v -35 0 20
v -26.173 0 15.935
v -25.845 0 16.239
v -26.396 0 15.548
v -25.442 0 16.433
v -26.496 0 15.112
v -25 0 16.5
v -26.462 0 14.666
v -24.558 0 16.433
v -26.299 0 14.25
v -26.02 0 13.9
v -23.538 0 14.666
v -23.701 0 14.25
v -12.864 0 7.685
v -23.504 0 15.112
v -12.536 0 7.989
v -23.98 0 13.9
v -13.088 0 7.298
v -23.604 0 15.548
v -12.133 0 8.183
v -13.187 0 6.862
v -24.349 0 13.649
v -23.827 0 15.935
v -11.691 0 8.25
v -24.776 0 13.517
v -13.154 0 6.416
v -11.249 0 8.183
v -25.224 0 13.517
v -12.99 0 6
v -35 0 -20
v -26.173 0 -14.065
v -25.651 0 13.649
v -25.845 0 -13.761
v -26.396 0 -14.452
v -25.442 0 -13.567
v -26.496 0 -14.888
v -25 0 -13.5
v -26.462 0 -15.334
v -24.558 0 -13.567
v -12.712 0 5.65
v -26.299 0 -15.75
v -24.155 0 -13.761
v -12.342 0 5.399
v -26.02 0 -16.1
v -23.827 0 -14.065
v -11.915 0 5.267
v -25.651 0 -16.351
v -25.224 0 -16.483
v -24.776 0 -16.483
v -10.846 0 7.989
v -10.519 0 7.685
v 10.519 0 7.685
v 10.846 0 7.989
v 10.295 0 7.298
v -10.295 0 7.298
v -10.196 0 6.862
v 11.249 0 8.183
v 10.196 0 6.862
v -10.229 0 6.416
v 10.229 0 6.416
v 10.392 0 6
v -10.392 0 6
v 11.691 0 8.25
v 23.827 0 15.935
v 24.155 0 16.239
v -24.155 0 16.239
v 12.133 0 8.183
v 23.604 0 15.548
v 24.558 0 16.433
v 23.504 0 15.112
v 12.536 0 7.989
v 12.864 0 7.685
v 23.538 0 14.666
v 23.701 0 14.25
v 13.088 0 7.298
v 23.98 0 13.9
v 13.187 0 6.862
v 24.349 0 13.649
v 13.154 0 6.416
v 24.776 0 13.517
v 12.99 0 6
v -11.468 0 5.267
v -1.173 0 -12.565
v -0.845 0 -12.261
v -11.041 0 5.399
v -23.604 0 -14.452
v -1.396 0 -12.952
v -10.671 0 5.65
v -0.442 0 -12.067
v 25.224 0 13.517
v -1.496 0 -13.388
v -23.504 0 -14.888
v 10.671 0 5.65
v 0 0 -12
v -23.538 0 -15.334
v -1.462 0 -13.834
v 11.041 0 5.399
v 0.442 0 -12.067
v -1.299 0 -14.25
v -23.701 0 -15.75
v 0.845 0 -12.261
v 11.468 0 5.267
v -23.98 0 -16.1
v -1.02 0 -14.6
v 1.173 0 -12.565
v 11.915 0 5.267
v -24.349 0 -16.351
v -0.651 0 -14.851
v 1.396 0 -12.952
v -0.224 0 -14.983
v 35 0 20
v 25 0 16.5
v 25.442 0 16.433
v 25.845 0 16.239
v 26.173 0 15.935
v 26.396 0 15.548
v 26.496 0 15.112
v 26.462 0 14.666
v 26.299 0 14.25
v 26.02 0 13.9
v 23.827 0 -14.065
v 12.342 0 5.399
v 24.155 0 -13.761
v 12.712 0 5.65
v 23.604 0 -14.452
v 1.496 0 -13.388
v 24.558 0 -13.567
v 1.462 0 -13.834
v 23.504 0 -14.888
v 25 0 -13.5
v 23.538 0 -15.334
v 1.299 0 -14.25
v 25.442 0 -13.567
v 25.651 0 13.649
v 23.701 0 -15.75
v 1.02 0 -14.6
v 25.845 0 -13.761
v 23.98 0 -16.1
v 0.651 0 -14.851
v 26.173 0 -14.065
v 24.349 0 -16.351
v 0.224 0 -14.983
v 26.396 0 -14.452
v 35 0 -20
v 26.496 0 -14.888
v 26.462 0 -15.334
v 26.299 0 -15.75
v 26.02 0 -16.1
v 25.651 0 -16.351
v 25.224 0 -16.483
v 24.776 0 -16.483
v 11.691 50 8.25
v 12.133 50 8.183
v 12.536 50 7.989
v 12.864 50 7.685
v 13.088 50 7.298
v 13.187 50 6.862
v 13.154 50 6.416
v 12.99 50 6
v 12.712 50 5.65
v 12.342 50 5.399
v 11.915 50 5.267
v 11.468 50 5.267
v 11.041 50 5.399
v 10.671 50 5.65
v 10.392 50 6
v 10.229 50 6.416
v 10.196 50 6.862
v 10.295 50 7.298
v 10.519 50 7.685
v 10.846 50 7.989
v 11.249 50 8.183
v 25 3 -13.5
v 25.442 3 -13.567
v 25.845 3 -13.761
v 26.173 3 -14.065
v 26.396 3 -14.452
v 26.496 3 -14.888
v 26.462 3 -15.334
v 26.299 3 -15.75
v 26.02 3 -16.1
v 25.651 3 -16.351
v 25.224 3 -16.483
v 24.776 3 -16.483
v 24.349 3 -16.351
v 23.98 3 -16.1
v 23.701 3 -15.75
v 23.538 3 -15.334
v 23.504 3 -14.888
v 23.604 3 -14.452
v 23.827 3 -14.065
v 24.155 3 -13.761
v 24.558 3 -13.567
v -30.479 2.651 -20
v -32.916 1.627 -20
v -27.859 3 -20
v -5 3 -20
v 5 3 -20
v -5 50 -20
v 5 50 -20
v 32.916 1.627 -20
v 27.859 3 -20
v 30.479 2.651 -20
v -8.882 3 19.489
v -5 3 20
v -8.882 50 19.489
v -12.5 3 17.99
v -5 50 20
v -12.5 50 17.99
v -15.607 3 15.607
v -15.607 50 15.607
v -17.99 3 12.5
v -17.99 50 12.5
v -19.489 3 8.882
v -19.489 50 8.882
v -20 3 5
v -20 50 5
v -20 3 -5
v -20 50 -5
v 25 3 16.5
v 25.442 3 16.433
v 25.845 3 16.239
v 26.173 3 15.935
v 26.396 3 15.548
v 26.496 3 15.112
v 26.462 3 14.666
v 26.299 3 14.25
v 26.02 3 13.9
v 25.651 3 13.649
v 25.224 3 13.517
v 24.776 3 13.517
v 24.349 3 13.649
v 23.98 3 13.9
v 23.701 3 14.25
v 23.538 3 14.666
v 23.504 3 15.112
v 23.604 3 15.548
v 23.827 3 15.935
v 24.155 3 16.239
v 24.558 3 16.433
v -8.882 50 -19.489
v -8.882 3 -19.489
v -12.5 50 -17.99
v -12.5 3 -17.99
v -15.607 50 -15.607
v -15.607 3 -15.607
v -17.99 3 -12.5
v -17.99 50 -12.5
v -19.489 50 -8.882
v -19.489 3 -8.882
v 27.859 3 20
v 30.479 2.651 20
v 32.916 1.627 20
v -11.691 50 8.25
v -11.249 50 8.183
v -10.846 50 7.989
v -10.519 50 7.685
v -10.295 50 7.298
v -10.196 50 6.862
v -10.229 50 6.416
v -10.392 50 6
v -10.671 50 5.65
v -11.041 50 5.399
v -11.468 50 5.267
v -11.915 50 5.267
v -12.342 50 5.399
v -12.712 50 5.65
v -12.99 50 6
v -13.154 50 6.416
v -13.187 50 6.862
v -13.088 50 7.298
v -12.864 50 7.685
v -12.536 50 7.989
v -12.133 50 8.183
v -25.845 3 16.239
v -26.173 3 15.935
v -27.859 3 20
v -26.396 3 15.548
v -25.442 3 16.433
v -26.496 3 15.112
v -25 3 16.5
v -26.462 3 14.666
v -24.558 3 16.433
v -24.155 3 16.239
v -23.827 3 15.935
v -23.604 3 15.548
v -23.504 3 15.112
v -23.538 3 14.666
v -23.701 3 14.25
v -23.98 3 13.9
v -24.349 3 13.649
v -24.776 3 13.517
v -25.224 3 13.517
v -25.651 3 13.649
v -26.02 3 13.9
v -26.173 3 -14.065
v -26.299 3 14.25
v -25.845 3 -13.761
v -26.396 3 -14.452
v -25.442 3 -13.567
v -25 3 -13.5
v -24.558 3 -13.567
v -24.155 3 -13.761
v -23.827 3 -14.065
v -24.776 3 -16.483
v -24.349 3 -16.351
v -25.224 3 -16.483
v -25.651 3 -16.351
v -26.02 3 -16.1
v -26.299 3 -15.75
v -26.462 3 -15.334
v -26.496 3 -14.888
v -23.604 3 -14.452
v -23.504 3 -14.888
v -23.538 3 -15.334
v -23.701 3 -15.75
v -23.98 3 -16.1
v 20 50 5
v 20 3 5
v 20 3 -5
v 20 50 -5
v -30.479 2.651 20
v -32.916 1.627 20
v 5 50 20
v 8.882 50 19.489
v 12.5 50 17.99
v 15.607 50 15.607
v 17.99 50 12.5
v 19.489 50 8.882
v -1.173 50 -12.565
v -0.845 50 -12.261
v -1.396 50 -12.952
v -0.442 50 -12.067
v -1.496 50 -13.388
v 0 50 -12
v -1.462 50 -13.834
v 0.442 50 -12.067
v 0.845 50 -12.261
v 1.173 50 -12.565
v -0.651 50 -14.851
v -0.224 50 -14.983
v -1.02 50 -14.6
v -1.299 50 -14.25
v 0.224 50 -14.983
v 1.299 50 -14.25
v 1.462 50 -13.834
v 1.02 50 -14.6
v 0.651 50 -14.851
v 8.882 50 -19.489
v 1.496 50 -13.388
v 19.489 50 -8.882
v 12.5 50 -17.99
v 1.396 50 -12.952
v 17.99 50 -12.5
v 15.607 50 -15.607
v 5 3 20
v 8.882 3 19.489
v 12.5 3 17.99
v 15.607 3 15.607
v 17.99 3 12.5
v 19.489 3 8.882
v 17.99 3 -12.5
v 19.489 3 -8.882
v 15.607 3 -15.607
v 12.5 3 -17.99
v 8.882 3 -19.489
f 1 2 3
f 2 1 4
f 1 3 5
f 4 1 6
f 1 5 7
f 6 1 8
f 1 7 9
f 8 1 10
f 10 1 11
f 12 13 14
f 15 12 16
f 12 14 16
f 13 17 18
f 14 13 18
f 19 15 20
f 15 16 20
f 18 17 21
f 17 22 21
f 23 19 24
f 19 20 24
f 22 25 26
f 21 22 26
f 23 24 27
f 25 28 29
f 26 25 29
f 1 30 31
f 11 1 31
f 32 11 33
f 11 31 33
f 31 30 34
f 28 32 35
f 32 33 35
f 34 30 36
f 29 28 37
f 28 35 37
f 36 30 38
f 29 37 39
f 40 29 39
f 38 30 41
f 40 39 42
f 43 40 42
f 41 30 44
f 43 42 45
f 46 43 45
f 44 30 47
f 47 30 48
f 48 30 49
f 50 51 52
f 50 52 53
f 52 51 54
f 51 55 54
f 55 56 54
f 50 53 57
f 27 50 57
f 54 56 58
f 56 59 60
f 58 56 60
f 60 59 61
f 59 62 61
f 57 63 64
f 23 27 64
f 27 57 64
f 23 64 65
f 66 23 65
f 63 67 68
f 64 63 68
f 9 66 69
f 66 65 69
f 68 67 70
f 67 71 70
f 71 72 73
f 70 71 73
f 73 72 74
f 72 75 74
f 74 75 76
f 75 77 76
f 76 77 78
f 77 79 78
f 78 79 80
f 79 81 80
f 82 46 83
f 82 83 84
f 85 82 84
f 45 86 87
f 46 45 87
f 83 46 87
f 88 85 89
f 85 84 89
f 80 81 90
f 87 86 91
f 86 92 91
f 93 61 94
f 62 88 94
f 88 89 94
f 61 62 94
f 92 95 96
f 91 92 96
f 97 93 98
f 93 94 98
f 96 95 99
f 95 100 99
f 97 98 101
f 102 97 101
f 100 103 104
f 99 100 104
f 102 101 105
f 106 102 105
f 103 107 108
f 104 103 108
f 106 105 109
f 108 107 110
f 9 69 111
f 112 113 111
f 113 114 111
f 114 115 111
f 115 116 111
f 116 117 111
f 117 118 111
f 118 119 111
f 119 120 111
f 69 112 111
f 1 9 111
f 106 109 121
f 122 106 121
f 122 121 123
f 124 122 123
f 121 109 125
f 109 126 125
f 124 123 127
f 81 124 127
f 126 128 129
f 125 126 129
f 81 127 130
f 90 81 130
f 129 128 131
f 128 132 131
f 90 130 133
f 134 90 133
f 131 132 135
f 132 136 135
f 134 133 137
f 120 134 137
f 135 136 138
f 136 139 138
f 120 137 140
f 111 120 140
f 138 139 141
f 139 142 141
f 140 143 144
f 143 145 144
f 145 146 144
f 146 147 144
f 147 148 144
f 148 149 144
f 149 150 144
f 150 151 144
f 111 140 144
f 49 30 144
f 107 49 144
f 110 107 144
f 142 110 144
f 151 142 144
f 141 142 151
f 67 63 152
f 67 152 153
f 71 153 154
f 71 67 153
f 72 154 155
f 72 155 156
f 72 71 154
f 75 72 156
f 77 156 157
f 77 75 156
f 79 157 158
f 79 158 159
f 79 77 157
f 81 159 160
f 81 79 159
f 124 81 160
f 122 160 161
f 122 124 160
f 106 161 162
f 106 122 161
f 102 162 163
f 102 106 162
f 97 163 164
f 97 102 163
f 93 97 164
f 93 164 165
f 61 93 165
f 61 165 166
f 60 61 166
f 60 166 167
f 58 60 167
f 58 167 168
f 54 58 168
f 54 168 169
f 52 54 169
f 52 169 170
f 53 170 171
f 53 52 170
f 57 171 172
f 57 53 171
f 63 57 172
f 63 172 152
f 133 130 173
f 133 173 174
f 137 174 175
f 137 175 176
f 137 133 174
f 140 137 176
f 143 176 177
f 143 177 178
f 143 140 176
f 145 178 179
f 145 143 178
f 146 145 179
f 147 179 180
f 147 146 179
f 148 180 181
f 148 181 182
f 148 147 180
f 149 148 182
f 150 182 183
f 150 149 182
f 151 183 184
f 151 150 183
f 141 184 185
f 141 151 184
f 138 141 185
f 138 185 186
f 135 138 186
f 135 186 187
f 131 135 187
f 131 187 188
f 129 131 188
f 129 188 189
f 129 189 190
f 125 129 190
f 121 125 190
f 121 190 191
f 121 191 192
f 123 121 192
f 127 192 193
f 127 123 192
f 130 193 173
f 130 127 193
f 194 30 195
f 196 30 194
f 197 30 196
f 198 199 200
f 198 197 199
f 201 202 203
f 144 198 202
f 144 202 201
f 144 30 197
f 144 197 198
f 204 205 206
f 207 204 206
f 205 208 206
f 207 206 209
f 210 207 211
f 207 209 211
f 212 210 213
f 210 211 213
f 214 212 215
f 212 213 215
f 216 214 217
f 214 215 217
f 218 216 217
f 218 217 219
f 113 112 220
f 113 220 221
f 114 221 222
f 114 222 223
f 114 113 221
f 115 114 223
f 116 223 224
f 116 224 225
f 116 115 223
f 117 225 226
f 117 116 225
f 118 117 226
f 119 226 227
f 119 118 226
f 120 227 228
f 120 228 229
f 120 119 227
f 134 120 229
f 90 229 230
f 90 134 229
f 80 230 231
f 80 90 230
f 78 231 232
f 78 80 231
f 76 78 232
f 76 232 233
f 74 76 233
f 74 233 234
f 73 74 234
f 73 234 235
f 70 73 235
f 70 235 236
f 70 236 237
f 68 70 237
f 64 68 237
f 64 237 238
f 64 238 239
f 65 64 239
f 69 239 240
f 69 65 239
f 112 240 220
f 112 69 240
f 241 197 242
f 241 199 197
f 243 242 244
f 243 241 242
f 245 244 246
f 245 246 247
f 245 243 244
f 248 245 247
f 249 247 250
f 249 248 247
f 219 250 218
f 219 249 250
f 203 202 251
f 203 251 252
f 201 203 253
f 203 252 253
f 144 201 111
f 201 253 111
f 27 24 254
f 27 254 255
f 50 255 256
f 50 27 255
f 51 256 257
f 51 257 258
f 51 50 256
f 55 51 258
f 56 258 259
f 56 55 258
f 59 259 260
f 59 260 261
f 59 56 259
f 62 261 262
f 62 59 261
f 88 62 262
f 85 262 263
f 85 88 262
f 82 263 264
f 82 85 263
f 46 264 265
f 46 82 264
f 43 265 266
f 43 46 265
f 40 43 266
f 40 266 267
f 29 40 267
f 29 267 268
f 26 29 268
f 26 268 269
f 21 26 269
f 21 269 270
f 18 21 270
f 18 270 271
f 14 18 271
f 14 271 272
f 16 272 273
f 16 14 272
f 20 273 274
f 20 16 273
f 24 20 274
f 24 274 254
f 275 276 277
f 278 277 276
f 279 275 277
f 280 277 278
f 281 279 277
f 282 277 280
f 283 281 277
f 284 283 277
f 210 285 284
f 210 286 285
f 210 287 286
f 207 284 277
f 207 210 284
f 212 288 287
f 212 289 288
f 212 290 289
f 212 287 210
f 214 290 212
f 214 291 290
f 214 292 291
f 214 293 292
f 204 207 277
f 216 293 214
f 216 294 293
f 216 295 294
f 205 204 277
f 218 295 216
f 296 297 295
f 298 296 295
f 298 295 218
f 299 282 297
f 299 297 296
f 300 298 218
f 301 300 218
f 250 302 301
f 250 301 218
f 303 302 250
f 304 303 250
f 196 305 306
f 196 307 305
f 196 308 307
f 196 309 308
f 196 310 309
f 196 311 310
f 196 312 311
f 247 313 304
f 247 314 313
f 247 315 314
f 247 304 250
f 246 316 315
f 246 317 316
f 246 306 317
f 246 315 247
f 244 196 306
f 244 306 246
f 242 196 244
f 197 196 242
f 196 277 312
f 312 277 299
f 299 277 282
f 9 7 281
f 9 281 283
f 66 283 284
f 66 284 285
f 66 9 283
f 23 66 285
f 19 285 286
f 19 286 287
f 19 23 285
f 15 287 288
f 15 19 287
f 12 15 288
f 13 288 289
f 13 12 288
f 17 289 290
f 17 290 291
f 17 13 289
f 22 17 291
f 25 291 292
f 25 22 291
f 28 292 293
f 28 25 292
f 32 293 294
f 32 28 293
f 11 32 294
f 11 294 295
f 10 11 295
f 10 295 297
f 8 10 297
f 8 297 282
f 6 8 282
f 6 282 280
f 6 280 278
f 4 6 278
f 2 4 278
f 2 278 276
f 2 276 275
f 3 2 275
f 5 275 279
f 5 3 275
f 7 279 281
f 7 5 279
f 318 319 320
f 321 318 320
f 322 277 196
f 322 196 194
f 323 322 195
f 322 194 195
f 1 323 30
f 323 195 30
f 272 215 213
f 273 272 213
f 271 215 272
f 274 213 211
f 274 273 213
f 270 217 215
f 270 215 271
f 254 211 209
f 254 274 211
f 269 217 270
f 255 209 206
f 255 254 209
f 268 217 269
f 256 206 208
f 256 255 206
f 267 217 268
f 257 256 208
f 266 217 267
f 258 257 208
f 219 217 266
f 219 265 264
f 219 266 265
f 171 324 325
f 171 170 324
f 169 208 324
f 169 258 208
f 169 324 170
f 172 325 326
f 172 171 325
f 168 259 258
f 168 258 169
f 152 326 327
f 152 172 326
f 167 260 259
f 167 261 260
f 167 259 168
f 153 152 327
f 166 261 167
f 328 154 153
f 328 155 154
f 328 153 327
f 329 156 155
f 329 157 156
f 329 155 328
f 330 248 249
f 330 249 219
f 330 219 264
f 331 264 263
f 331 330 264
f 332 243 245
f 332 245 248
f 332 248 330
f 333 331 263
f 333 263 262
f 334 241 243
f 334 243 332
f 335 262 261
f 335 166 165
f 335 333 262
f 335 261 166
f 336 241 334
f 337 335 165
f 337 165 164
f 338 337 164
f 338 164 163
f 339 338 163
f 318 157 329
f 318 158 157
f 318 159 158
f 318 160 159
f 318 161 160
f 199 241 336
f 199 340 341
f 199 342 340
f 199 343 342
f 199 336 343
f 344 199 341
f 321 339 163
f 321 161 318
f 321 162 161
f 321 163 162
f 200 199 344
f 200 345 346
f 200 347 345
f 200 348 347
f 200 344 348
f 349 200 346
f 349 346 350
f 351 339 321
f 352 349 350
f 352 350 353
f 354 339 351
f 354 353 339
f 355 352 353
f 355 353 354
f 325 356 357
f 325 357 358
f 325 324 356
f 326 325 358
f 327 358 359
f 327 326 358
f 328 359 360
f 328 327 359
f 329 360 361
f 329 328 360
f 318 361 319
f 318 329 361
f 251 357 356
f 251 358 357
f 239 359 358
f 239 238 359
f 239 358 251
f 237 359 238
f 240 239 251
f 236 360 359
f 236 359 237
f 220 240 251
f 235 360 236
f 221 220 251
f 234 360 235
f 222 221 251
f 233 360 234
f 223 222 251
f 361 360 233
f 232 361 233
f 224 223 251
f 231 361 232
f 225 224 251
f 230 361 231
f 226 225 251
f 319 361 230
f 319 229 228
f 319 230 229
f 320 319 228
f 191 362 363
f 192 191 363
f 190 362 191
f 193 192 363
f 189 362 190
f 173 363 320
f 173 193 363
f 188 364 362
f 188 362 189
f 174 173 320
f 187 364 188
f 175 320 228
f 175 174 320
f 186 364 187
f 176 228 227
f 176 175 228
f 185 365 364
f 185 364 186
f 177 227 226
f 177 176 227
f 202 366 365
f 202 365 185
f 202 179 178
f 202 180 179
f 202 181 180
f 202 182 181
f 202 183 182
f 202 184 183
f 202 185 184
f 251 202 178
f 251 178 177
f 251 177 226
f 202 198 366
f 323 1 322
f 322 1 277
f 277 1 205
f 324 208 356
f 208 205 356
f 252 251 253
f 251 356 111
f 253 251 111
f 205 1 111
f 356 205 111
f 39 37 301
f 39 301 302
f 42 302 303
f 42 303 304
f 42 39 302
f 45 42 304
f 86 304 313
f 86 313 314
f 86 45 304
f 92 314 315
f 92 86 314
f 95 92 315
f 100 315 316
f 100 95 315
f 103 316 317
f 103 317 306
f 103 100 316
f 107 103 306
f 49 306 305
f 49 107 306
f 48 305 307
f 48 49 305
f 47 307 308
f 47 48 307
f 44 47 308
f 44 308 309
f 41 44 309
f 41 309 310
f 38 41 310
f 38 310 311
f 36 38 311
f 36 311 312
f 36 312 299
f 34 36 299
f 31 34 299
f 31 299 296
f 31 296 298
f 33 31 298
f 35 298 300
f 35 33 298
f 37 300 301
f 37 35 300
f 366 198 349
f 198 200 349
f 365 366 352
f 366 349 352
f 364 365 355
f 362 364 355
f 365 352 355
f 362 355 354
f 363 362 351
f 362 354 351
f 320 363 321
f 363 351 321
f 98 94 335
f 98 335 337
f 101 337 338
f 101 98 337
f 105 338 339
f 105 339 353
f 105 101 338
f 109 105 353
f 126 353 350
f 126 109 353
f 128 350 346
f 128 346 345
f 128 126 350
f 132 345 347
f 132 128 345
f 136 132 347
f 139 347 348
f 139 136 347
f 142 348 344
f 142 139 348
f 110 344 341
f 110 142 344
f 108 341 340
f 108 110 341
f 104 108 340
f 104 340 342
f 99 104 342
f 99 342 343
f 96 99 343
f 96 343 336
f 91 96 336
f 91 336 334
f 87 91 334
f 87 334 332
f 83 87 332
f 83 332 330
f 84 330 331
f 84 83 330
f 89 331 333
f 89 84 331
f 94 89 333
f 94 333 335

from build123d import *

# Parameters (mm, degrees)
SKETCH1_W           = 40
SKETCH1_H           = 40
SKETCH1_R           = 1.5
BOSS_EXTRUDE1_DEPTH = 50
SKETCH1_3_W         = 15
SKETCH1_3_H         = 40
SKETCH1_3_R         = 1.5
BOSS_EXTRUDE2_DEPTH = 3
FILLET1_R           = 10
FILLET2_R           = 15


with BuildPart() as part:
    # Sketch1 → Boss-Extrude1 (new body)
    with BuildSketch(Plane(origin=(0, 0, 0), x_dir=(1, 0, 0), z_dir=(0, 1, 0))):
        Rectangle(SKETCH1_W, SKETCH1_H)
        with Locations(Location((-11.691342951, -6.75, 0), (0, 0, 270))):
            Circle(SKETCH1_R, mode=Mode.SUBTRACT)
        with Locations(Location((11.691342951, -6.75, 0), (0, 0, 270))):
            Circle(SKETCH1_R, mode=Mode.SUBTRACT)
        with Locations(Location((0, 13.5, 0), (0, 0, 270))):
            Circle(SKETCH1_R, mode=Mode.SUBTRACT)
    extrude(amount=BOSS_EXTRUDE1_DEPTH)

    # Sketch1<3> → Boss-Extrude2 (add)
    # profile 1 of 2: a face of its own
    with BuildSketch(Plane(origin=(0, 0, 0), x_dir=(1, 0, 0), z_dir=(0, 1, 0))):
        with Locations((-27.5, 0)):
            Rectangle(SKETCH1_3_W, SKETCH1_3_H)
        with Locations(Location((-25, -15, 0), (0, 0, 270))):
            Circle(SKETCH1_3_R, mode=Mode.SUBTRACT)
        with Locations(Location((-25, 15, 0), (0, 0, 270))):
            Circle(SKETCH1_3_R, mode=Mode.SUBTRACT)
    # profile 2 of 2: a face of its own
    with BuildSketch(Plane(origin=(0, 0, 0), x_dir=(1, 0, 0), z_dir=(0, 1, 0))):
        with Locations((27.5, 0)):
            Rectangle(SKETCH1_3_W, SKETCH1_3_H)
        with Locations(Location((25, -15, 0), (0, 0, 270))):
            Circle(SKETCH1_3_R, mode=Mode.SUBTRACT)
        with Locations(Location((25, 15, 0), (0, 0, 270))):
            Circle(SKETCH1_3_R, mode=Mode.SUBTRACT)
    extrude(amount=BOSS_EXTRUDE2_DEPTH)

    # Fillet1
    # the kernel refuses this fillet: 10 mm, written as the material it takes off along each edge
    with BuildSketch(Plane(origin=(35, 3, 37.853571071), x_dir=(0, -1, 0), z_dir=(0, 0, -1))) as fillet1_piece_1:
        with BuildLine():
            CenterArc((10, 7.141428429), FILLET1_R, 180, 45.572995999)
            Line((0, 7.141428429), (-0.2, 7.141428429))
            Line((-0.2, 7.141428429), (-0.2, 0))
            Line((-0.2, 0), (0, -0.2))
            ThreePointArc((0, -0.2), (1.5, -0.2), (2.86, -0.142828569))
            Line((2.86, -0.142828569), (3, 0))
        make_face()
    extrude(amount=75.707142143, mode=Mode.SUBTRACT)
    with BuildSketch(Plane(origin=(-35, 3, -37.853571071), x_dir=(1, 0, 0), z_dir=(0, 0, 1))) as fillet1_piece_2:
        with BuildLine():
            CenterArc((7.141428429, -10), FILLET1_R, 90, 45.572995999)
            Line((0, -3), (-0.142828569, -2.86))
            ThreePointArc((-0.142828569, -2.86), (-0.2, -1.5), (-0.2, 0))
            Line((-0.2, 0), (0, 0.2))
            Line((0, 0.2), (7.141428429, 0.2))
            Line((7.141428429, 0.2), (7.141428429, 0))
        make_face()
    extrude(amount=75.707142143, mode=Mode.SUBTRACT)

    # Fillet2
    fillet2_edges = [part.edges().sort_by_distance(p)[0] for p in [
        (-20, 26.5, -20),
        (20, 26.5, -20),
        (20, 26.5, 20),
        (-20, 26.5, 20),
    ]]
    fillet(fillet2_edges, radius=FILLET2_R)


solid = part.part
